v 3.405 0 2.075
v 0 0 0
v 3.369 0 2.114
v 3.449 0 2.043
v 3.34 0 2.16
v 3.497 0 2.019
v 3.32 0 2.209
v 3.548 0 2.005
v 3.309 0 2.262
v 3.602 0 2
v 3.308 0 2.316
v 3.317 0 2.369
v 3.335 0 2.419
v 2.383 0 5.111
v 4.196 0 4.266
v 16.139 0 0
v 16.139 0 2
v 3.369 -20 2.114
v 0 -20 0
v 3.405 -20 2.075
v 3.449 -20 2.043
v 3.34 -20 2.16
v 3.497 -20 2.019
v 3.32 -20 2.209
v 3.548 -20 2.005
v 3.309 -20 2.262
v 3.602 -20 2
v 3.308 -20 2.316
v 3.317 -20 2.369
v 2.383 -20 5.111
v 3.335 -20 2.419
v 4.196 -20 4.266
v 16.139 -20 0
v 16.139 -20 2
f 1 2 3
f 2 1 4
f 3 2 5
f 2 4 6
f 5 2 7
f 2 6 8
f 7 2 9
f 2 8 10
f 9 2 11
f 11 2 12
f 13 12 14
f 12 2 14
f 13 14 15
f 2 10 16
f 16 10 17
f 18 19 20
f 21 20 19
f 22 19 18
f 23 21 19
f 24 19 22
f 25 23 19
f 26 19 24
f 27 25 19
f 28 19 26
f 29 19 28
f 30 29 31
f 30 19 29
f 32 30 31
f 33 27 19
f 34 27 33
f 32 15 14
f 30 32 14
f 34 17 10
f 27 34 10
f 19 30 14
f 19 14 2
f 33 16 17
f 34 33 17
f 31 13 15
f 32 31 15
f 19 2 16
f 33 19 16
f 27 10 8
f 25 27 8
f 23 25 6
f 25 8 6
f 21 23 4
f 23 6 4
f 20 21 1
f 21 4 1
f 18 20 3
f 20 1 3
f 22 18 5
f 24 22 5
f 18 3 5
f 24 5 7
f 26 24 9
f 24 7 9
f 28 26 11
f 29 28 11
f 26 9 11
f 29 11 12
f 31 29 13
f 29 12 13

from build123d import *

# Parameters (mm, degrees)
F1_DEPTH = 20


with BuildPart() as f1:
    # F0 (on Front) → F1 (new body)
    with BuildSketch(Plane.XZ):
        with BuildLine():
            Line((2.383301, 5.111006), (0, 0))
            Line((0, 0), (16.139371, 0))
            Line((16.139371, 0), (16.139371, 2))
            Line((16.139371, 2), (3.601872, 2))
            ThreePointArc((3.601872, 2), (3.35337, 2.136333), (3.334832, 2.419168))
            Line((3.334832, 2.419168), (4.195917, 4.265769))
            Line((4.195917, 4.265769), (2.383301, 5.111006))
        make_face()
    extrude(amount=F1_DEPTH)


solid = f1.part
